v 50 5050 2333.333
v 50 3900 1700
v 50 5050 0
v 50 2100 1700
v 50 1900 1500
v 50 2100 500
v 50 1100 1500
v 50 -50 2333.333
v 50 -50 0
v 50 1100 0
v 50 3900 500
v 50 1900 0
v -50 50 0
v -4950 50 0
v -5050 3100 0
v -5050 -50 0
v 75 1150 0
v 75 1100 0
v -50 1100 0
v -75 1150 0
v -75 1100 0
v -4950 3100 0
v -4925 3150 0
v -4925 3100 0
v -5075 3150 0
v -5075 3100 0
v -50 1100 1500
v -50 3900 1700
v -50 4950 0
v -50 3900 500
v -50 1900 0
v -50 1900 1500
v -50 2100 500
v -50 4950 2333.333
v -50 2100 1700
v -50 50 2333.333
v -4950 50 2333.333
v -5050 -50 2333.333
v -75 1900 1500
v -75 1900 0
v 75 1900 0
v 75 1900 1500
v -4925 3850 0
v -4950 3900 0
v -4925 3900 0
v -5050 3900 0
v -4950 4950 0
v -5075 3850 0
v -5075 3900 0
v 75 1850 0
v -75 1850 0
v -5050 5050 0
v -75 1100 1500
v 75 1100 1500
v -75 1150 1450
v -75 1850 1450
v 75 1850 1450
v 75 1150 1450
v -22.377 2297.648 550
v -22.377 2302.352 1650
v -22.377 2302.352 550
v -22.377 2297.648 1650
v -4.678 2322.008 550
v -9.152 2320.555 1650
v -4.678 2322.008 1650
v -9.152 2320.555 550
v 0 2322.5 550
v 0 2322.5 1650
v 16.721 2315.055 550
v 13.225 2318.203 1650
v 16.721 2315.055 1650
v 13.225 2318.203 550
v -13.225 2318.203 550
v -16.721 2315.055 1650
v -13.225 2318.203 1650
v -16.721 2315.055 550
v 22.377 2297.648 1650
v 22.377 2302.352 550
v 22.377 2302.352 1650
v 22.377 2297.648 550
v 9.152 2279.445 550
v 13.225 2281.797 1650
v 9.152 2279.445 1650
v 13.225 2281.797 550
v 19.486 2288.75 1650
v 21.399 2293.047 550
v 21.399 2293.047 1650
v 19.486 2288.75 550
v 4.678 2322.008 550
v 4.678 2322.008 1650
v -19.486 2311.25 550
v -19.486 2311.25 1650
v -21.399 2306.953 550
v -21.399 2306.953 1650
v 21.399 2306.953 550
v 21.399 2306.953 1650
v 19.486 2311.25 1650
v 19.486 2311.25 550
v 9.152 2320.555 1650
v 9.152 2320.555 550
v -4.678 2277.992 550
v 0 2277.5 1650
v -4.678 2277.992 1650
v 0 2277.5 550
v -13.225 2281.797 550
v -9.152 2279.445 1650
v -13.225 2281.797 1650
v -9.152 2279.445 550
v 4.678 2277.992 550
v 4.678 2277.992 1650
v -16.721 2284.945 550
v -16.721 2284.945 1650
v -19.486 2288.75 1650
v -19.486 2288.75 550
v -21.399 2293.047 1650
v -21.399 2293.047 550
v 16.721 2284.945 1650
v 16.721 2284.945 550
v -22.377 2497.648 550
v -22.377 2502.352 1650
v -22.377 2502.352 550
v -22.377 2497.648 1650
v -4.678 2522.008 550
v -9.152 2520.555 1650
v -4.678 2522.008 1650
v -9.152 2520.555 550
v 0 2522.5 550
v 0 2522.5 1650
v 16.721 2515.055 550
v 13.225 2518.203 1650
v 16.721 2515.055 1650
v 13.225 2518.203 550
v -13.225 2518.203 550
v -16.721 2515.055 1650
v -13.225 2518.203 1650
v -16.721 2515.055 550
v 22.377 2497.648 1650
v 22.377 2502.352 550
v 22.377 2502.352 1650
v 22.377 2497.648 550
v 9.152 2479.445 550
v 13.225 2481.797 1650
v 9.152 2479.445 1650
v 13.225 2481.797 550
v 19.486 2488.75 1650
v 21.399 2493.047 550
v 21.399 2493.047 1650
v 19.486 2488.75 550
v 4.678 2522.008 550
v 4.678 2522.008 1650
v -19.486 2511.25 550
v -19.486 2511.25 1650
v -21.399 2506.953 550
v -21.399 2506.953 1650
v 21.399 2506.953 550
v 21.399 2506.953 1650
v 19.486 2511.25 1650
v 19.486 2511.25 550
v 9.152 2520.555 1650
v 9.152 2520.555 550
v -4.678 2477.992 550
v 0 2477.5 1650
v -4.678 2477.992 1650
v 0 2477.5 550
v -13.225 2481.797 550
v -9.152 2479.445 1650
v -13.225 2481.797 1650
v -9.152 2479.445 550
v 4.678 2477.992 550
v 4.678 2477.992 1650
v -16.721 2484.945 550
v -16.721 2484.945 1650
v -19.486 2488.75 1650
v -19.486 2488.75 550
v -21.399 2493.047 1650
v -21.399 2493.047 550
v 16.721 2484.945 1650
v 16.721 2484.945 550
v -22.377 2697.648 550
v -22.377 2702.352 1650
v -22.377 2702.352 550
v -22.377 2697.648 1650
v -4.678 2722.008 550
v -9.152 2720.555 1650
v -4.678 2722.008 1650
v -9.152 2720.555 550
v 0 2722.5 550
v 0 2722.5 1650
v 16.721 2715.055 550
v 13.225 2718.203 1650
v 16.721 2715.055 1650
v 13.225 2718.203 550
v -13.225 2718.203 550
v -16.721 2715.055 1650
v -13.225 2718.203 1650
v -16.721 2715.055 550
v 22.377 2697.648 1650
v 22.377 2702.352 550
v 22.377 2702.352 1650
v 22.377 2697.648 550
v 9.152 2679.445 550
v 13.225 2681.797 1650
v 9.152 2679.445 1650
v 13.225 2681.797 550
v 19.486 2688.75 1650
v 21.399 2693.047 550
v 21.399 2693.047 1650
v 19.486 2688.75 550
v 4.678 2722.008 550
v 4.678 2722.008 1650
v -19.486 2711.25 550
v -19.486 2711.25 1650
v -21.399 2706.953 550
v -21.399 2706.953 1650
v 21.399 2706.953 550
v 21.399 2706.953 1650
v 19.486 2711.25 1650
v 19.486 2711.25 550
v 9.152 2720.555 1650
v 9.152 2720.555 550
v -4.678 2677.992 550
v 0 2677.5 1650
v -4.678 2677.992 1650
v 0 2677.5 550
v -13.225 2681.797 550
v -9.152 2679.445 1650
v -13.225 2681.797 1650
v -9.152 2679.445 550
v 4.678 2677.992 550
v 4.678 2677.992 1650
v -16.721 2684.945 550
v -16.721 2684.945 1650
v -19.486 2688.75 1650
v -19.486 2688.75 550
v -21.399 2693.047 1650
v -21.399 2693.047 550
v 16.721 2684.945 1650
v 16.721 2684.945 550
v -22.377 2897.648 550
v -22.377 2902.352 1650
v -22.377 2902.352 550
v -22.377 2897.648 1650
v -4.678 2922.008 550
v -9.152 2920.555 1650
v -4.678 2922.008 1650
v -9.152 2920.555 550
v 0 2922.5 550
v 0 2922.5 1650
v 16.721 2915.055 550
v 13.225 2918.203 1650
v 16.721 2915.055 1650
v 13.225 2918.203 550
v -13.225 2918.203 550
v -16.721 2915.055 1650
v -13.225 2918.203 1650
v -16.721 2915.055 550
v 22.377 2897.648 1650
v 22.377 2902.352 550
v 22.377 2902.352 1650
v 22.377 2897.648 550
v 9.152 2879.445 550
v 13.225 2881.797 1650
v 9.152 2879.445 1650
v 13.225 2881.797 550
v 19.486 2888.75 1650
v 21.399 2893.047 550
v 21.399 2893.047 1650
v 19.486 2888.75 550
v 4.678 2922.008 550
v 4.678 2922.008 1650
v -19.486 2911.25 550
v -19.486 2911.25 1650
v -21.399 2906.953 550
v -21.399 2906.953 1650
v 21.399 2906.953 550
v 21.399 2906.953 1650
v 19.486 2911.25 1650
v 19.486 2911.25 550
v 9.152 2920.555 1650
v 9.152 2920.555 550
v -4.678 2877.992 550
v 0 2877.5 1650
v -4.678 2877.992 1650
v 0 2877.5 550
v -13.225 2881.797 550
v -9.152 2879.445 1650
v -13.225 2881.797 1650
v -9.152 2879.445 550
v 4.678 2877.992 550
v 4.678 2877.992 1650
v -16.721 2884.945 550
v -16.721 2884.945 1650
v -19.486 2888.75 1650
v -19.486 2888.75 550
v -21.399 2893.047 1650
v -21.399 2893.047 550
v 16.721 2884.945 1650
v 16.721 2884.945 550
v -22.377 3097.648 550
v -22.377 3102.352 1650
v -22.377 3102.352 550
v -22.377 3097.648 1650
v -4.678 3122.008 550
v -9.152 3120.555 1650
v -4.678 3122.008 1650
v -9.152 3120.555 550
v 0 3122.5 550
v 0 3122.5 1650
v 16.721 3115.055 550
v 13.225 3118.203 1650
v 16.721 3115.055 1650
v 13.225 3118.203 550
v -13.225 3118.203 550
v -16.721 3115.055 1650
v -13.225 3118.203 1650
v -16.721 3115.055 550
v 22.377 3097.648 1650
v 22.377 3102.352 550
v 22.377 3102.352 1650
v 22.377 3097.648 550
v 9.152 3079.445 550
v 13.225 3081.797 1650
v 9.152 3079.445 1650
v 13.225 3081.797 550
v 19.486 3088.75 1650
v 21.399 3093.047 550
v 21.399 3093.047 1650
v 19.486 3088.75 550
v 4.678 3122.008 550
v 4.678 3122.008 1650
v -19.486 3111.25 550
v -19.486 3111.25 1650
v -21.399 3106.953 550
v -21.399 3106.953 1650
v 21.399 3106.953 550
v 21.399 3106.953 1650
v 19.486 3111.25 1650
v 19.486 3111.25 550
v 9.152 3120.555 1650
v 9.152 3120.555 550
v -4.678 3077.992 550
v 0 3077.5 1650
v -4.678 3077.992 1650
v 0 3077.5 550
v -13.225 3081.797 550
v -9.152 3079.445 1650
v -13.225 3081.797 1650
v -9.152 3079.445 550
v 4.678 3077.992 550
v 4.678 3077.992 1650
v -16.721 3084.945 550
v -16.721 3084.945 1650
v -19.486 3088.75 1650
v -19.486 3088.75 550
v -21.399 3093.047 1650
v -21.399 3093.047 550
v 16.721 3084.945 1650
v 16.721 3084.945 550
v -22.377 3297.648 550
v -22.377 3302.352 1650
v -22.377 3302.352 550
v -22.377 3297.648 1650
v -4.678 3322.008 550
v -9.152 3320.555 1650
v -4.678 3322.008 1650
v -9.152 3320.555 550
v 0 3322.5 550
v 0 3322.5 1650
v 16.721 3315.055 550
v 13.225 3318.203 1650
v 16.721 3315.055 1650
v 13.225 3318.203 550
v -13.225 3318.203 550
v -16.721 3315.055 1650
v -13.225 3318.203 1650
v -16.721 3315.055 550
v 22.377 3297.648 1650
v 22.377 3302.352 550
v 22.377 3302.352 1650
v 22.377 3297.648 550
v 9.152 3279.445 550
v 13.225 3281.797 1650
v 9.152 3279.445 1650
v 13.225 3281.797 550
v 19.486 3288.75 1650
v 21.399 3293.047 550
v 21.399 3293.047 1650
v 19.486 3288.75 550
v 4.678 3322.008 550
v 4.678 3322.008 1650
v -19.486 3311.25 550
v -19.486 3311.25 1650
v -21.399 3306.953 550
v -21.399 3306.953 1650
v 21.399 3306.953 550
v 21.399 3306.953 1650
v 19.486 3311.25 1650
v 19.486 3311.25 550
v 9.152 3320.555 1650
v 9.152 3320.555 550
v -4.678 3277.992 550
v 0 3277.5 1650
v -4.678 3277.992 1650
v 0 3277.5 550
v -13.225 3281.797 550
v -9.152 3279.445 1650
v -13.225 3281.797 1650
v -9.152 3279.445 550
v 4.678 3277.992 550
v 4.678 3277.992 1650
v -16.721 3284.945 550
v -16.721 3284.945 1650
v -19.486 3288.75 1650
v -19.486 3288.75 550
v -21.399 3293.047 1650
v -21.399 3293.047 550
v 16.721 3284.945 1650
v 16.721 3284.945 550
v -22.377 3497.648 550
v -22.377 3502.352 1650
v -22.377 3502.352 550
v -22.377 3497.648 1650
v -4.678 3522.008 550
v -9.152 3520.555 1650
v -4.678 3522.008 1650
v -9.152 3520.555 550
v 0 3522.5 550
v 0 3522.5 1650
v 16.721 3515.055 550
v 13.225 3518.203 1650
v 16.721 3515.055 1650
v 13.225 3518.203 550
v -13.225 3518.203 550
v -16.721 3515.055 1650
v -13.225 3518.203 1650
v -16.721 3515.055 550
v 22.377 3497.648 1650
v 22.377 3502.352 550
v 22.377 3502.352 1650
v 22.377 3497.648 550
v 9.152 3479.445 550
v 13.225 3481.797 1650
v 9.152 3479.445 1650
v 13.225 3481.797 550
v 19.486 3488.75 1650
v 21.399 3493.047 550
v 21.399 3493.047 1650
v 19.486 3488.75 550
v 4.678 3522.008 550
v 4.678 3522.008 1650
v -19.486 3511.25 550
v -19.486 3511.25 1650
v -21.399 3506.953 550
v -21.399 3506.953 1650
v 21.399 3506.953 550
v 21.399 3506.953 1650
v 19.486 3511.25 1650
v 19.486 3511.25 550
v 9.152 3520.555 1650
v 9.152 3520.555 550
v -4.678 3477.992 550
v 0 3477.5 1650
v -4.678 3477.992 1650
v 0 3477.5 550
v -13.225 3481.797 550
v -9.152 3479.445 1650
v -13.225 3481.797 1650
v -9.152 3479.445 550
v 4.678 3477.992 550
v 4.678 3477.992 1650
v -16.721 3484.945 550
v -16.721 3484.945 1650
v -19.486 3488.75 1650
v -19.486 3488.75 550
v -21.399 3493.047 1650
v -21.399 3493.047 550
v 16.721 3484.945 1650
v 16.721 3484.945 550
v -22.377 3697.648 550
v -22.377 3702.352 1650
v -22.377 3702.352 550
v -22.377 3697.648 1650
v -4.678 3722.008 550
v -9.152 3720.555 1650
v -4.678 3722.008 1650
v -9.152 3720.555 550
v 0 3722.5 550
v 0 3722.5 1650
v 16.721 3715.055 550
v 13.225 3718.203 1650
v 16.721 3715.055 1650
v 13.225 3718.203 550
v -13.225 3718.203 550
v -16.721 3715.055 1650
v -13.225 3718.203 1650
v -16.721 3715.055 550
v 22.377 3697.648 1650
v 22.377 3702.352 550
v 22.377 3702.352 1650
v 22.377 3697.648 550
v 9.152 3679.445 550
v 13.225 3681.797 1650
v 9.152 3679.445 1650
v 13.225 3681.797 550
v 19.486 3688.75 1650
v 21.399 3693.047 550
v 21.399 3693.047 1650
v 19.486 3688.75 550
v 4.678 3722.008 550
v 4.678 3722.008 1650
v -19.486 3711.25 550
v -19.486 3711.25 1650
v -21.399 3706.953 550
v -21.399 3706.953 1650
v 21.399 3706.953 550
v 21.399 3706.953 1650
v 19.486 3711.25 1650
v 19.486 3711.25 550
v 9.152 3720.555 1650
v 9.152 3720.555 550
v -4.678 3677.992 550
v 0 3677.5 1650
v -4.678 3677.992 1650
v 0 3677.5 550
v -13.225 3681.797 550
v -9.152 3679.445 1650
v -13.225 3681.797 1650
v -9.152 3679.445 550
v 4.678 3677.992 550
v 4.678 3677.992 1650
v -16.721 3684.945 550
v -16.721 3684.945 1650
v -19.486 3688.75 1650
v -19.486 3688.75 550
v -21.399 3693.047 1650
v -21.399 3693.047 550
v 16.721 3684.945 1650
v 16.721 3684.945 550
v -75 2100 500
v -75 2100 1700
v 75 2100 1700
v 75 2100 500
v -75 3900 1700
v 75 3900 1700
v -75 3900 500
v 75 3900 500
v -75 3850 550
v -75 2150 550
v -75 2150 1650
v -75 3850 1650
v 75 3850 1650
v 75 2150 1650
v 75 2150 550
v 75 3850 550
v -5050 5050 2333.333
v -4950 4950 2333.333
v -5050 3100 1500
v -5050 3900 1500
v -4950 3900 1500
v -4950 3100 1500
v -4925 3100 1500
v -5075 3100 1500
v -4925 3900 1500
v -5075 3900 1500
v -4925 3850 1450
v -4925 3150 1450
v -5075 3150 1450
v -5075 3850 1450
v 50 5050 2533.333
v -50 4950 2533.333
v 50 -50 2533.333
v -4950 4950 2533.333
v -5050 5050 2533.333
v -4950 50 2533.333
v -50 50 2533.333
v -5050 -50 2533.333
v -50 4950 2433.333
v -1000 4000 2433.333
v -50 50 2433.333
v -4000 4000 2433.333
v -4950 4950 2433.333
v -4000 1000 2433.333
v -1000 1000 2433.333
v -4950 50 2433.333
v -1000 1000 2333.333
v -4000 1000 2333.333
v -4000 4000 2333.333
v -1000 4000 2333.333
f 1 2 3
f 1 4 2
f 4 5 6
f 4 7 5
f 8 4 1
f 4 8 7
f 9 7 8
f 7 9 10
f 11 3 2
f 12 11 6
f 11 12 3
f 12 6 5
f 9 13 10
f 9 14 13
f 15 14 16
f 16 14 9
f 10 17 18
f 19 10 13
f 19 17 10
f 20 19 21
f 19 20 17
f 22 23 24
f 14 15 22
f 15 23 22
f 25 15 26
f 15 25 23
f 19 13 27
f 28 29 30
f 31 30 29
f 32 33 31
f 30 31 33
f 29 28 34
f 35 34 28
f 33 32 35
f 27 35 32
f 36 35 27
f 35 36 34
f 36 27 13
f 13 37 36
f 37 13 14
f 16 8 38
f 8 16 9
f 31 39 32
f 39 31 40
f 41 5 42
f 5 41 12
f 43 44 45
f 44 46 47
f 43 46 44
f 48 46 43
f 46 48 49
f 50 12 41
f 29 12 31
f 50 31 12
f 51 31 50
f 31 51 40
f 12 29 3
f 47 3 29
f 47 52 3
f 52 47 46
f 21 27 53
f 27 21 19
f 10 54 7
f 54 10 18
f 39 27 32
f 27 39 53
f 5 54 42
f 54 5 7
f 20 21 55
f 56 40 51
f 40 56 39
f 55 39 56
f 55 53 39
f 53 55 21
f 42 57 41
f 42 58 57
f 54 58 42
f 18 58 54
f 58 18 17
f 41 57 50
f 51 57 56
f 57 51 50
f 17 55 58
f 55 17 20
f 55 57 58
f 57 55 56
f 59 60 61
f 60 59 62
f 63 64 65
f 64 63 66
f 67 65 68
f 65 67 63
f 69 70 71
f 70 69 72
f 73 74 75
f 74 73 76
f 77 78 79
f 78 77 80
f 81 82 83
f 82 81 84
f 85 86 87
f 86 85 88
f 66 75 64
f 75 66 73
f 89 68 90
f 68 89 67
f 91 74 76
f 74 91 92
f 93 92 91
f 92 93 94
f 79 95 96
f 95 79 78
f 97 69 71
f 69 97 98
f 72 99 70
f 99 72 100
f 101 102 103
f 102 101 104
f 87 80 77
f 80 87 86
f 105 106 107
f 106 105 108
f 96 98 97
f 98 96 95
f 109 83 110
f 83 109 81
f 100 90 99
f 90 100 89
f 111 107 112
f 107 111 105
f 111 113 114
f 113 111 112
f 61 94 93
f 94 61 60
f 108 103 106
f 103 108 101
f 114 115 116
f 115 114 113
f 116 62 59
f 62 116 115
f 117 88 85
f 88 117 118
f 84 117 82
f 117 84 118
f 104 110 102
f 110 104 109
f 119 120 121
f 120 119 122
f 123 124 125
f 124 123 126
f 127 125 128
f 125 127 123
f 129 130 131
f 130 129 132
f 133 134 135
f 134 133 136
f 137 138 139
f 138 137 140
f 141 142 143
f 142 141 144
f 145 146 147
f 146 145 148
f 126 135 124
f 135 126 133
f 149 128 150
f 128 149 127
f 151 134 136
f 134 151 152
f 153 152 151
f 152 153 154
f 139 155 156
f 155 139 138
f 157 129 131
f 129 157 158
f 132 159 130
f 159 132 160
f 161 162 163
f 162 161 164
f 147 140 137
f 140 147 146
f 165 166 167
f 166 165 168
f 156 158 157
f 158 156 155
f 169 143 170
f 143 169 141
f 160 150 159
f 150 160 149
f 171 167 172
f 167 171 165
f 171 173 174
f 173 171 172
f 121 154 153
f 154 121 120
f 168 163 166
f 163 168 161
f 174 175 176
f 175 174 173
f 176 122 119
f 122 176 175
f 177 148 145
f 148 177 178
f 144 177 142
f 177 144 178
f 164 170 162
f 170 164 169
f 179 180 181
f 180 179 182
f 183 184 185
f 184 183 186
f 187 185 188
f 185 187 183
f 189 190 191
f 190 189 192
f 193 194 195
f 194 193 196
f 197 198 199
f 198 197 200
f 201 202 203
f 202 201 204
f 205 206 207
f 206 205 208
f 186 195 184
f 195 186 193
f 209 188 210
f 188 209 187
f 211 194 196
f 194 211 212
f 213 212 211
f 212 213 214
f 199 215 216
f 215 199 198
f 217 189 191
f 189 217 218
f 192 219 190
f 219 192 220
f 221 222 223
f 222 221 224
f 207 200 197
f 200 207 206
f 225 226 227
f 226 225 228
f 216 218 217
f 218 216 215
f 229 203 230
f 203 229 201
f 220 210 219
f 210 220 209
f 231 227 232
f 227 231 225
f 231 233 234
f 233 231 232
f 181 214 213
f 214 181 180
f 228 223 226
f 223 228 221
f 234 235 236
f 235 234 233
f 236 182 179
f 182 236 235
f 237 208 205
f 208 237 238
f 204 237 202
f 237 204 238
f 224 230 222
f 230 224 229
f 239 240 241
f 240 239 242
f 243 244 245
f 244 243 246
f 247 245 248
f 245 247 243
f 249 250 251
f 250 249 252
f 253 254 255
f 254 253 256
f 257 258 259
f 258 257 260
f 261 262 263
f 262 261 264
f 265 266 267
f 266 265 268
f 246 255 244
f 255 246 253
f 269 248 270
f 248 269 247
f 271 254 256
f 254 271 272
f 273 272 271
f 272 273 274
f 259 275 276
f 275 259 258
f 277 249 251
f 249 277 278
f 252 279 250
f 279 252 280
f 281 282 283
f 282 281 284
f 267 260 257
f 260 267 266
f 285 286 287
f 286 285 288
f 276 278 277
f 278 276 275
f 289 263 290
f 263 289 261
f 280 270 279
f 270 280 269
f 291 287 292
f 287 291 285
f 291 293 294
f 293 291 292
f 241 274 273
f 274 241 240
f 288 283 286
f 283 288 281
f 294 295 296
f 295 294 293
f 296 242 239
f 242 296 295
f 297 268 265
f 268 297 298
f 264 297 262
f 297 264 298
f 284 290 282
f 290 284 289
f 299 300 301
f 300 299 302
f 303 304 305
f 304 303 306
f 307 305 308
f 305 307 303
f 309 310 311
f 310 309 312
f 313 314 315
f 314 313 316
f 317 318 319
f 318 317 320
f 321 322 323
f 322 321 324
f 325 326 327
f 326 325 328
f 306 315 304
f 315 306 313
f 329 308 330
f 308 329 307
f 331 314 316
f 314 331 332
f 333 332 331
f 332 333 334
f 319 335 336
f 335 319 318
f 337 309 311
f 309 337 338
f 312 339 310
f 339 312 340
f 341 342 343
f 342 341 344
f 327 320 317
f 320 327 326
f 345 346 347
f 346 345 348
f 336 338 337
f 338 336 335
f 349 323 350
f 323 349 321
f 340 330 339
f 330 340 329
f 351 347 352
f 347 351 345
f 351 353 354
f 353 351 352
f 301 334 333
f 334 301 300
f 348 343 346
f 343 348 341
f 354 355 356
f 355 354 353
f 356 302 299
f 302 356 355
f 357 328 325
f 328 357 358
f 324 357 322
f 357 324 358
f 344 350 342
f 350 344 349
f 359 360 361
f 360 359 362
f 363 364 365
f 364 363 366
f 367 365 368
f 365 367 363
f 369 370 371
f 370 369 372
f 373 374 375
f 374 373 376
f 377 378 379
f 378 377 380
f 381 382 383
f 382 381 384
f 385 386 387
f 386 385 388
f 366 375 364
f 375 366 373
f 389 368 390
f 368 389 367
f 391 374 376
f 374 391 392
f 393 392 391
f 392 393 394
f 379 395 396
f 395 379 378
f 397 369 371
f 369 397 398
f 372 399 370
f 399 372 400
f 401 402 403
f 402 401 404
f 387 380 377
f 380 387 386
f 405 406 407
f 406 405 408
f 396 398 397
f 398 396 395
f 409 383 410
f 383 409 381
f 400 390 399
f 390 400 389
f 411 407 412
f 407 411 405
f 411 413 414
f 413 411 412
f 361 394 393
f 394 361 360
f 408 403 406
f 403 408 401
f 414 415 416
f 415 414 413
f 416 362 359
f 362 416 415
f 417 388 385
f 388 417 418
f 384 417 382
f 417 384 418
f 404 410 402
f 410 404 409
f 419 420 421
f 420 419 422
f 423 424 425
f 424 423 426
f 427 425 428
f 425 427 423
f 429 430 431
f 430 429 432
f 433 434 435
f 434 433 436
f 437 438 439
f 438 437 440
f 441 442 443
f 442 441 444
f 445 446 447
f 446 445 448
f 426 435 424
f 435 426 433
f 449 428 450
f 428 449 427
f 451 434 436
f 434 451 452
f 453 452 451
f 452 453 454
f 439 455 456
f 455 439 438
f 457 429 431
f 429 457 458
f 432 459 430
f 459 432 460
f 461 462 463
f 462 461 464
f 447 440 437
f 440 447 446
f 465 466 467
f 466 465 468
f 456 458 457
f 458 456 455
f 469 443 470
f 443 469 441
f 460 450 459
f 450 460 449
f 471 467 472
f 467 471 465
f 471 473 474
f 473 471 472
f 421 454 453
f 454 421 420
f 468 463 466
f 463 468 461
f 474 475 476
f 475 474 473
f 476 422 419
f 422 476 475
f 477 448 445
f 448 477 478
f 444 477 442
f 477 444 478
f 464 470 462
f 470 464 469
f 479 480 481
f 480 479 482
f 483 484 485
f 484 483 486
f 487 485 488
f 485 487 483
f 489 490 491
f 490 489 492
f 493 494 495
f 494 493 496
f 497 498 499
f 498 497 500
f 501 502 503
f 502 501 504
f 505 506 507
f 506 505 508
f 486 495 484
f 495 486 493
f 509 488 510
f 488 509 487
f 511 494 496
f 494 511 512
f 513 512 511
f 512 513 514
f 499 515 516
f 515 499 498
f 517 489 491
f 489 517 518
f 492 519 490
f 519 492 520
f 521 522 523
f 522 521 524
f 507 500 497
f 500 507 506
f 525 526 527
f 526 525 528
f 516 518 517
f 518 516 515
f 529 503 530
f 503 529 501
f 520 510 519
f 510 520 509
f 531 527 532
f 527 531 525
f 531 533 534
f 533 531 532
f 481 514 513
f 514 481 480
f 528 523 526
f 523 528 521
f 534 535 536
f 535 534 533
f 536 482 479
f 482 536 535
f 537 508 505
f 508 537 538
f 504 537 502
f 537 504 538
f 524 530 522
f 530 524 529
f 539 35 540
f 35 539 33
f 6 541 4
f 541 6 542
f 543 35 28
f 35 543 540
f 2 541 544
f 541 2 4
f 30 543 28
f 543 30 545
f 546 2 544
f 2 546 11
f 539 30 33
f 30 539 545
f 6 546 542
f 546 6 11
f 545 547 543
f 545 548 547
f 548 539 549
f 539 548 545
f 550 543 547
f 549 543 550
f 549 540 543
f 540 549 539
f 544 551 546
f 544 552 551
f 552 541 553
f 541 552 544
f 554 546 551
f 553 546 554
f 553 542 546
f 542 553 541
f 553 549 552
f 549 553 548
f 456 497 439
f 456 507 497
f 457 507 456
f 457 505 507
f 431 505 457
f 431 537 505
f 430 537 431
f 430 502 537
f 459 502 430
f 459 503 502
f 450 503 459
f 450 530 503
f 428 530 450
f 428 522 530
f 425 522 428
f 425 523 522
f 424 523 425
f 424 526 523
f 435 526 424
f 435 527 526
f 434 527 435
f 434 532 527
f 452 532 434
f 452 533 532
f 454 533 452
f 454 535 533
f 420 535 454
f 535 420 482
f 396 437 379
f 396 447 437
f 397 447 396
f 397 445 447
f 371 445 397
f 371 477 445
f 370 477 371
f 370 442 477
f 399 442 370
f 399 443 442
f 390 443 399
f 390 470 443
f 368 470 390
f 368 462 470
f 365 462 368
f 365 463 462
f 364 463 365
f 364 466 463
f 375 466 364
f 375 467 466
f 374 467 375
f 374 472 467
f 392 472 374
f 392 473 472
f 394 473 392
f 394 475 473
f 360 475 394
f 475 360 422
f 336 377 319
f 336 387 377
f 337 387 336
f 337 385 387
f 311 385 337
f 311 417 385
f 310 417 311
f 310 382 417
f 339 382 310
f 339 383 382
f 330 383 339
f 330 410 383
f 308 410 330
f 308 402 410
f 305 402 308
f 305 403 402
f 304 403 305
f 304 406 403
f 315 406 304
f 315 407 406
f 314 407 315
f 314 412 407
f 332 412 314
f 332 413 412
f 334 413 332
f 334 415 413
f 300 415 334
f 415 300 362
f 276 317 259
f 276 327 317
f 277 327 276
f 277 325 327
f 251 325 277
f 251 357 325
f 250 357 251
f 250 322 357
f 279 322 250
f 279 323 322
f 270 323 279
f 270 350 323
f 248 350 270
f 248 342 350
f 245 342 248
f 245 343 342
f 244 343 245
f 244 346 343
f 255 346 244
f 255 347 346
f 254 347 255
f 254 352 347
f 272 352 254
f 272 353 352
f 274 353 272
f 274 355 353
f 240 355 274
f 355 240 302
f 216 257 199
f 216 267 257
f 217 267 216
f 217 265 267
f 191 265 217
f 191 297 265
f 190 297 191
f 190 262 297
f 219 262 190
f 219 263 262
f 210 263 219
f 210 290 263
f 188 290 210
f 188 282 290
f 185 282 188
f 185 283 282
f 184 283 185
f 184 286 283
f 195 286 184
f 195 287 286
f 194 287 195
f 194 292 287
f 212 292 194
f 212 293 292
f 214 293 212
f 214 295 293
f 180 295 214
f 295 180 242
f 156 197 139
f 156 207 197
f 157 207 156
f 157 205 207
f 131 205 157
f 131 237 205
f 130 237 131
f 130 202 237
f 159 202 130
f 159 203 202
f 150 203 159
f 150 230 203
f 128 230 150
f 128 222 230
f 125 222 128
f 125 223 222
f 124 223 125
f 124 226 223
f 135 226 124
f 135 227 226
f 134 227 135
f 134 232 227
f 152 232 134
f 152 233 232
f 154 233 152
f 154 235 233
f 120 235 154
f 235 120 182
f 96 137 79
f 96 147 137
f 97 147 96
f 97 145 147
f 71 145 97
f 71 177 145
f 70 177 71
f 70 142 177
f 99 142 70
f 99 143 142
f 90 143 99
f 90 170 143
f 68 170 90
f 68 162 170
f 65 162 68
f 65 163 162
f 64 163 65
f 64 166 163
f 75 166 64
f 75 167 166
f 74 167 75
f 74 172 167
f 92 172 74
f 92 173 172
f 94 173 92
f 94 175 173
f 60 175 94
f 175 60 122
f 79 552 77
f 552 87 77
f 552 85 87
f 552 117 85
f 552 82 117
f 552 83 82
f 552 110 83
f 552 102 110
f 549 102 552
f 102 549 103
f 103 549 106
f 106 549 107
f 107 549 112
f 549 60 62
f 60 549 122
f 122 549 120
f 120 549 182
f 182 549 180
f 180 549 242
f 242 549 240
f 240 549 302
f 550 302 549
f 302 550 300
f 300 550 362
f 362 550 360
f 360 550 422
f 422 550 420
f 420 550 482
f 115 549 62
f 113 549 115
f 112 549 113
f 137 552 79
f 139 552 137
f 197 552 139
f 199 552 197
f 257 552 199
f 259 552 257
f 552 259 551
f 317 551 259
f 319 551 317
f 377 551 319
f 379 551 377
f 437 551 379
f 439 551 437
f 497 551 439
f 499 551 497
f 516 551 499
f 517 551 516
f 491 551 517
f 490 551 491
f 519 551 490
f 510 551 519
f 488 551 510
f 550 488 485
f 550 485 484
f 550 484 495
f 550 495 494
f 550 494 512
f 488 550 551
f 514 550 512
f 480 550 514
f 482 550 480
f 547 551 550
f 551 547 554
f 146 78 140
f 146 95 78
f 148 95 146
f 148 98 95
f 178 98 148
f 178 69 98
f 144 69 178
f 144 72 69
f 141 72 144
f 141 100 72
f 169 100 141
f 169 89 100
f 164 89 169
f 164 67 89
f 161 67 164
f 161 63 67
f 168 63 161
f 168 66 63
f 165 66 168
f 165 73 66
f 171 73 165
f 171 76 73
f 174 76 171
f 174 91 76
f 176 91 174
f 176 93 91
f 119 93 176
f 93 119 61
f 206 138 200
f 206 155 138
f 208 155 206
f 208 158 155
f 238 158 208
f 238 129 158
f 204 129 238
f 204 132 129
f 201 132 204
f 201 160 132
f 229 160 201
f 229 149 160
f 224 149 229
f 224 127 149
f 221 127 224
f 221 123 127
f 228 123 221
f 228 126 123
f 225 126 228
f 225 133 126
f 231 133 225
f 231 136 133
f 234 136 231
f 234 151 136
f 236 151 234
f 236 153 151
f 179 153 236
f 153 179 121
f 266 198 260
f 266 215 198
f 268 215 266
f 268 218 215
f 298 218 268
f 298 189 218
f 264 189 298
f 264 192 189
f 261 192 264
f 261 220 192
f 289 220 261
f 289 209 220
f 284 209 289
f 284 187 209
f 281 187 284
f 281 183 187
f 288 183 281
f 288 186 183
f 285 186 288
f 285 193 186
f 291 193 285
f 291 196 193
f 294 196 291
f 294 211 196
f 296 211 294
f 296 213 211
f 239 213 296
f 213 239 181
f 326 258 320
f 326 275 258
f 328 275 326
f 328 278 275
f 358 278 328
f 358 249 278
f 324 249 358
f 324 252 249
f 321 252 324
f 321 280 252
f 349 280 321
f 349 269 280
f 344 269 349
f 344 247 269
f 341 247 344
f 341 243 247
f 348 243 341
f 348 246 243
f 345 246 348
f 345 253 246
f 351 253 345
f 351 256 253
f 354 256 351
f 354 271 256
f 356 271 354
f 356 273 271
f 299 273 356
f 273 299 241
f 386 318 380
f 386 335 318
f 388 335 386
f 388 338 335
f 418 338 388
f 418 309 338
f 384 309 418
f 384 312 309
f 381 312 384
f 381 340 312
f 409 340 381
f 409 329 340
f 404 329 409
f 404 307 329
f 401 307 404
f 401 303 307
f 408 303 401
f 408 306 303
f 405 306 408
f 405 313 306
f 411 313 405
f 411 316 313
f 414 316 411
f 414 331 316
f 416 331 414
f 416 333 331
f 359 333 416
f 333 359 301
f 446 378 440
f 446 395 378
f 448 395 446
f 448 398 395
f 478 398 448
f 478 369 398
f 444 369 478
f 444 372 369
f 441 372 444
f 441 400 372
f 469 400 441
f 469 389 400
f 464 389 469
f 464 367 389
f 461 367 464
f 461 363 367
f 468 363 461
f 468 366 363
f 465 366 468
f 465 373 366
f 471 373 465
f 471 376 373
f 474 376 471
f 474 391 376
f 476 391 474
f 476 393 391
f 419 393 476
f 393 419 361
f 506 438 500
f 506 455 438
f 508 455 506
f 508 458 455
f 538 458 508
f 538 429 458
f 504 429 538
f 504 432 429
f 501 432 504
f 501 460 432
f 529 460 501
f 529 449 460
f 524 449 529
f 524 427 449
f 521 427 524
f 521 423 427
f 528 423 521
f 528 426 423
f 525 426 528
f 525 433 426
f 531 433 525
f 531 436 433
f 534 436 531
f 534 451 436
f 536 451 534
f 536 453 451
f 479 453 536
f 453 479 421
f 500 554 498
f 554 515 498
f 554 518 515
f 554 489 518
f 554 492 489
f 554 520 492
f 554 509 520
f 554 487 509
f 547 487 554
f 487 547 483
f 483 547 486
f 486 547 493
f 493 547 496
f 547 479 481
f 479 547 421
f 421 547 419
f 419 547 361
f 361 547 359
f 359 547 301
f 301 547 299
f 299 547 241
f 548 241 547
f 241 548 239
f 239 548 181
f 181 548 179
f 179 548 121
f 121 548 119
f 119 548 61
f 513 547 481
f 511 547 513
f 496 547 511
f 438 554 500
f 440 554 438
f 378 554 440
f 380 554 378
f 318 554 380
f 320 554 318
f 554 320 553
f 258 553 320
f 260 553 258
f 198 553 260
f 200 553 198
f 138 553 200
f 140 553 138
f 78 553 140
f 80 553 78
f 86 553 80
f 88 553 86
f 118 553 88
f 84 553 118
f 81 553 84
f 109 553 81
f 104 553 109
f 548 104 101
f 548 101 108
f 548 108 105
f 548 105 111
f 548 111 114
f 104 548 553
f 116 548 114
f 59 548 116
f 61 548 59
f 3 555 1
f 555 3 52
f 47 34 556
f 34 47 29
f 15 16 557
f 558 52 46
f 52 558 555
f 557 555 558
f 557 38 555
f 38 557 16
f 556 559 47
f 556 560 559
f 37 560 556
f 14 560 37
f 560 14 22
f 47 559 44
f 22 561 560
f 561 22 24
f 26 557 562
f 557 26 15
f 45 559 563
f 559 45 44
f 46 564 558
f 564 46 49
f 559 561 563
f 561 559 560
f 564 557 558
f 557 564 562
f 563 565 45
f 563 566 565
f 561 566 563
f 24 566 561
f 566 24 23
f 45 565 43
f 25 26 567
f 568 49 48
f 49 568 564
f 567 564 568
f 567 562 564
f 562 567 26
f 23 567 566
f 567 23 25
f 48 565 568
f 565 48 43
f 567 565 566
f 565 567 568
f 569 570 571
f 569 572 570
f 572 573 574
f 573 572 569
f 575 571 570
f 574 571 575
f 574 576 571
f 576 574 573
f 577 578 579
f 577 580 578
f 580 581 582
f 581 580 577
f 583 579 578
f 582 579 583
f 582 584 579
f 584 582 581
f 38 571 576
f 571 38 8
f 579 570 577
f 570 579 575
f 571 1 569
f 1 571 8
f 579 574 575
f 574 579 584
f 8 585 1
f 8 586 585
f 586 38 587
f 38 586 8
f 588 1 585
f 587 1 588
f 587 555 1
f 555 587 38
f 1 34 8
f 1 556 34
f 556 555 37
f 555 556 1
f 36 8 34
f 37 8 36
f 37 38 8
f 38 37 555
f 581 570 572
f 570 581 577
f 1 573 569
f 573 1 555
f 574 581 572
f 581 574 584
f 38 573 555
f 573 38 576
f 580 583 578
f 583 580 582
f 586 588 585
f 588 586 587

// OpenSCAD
// file: ../../libs/templates/t_flat-roof.scad
include <../basic-dims.scad>

flat_roof_wall_offset = section_thickness/2;

module flat_roof_straight() {
    rotate([0, 0, 90])
    translate([0, -flat_roof_wall_offset, 0])
    union() {
        translate([0, 0, section_thickness])
        cube([section_width, section_thickness, section_thickness]);
        cube([section_width, section_width + flat_roof_wall_offset, section_thickness]);
    }
}

module flat_roof_corner() {
    rotate([0, 0, 90])
    translate([-flat_roof_wall_offset, -flat_roof_wall_offset, 0])
    union() {
        translate([0, 0, section_thickness]) {
            cube([section_width + flat_roof_wall_offset, section_thickness, section_thickness]);
            cube([section_thickness, section_width + flat_roof_wall_offset, section_thickness]);
        }
        cube([
                section_width + flat_roof_wall_offset,
                section_width + flat_roof_wall_offset,
                section_thickness
            ]);
    }
}

module flat_roof_diagonal() {
    corrected_width = section_width + flat_roof_wall_offset;

    rotate([0, 0, 180])
    translate([-flat_roof_wall_offset, -flat_roof_wall_offset - section_width, 0])
    union() {
        linear_extrude(section_thickness)
        polygon([
            [0, corrected_width],
            [corrected_width, corrected_width],
            [corrected_width, 0]
        ]);

        translate([0, 0, section_thickness])
        linear_extrude(section_thickness)
        polygon([
            [0, corrected_width],
            [section_thickness, corrected_width],
            [corrected_width, section_thickness],
            [corrected_width, 0]
        ]);
    }
}

module flat_roof_square() {
    translate([-section_width, 0, 0])
    cube([section_width, section_width, section_thickness]);
}
// file: ../../libs/modifiers/diagonalize.scad
include <../basic-dims.scad>

module diagonalize_triangle_sketch(t = section_thickness) {
    x = sin(45) * t;
    y = cos(45) * t;

    polygon([
        [0, y],
        [x, 0],
        [0, -y]
    ]);
}

module diagonalize_triangle(t = section_thickness) {
    rotate([0, 0, 90])
    linear_extrude(section_height)
    diagonalize_triangle_sketch(t);
}

module diagonalize2D() {
    thickness = section_thickness / rt;

    trans = (section_thickness/2)*rt/2;
    len_scale = rt - section_thickness / (rt * section_width);

    rotate([0, 0, 45])
    translate([trans, 0, 0])
    scale([len_scale, 1/rt, 1])
    children();
}


module diagonalize3D(w = section_width, t = section_thickness, edges = "trans") {

    trans = (t/2)*rt/2;
    len_scale = rt - t / (rt * w);

    edge_angle = edges == "cis" ? 270 : 180;
    
    diagonalize_triangle(t/rt);

    translate([-w, w, 0])
    rotate([0, 0, edge_angle]) // 180 For continue, -90 (270) for end
    diagonalize_triangle(t/rt);

    rotate([0, 0, 45])
    translate([0, trans, 0])
    scale([1/rt, len_scale, 1])
    children();
}
// file: ../../libs/modifiers/cornerize.scad
include <../basic-dims.scad>

trim_depth = 10000;

module cornerize_trim(amount, height = section_height) {
    difference() {
        children();
        translate([-trim_depth/2, 0, 0])
        cube([trim_depth, amount, height]);
    }
}

//  Child 0 is front
//  Child 1 is side
module cornerize(front_width = section_width, front_thickness = section_thickness,
    side_width = section_width, side_thickness = section_thickness, height=section_height) {
    
    new_front_size = front_width - side_thickness/2;
    front_scale_amt = new_front_size / front_width;
    
    new_side_size = side_width - front_thickness/2;
    side_scale_amt = new_side_size / side_width;

    //translate([0, side_thickness/2, 0])
    //scale([1, front_scale_amt, 1])
    cornerize_trim(side_thickness/2)
    children(0);

    rotate([0, 0, 90])
    cornerize_trim(front_thickness/2)
    children(1);

    translate([-front_thickness/2, -side_thickness/2, 0])
    cube([front_thickness, side_thickness, height]);
}
// file: ../../libs/templates/t_window-frame.scad
include <../basic-dims.scad>
include <./t_window.scad>

window_frame_frame_thickness = unit / 20;
window_frame_frame_depth = section_thickness + window_frame_frame_thickness;

window_frame_total_width = simple_window_width;
window_frame_total_height = simple_window_height;

module window_frame_sketch() {

    pane_width = window_frame_total_width - window_frame_frame_thickness*2;
    pane_height = window_frame_total_height/2 - window_frame_frame_thickness*3/2;

    pane_horz_trans = window_frame_total_width/2 - pane_width/2;

    difference() {
        square([window_frame_total_width,  window_frame_total_height]);

        translate([pane_horz_trans, pane_height + window_frame_frame_thickness*2, 0])
        square([pane_width, pane_height]);

        translate([pane_horz_trans, window_frame_frame_thickness, 0])
        square([pane_width, pane_height]);
    }
}

module window_frame() {
    translate([-window_frame_frame_depth/2, section_width/2-window_frame_total_width/2, simple_window_bottom_offset])
    rotate([90, 0, 90])
    linear_extrude(window_frame_frame_depth)
    window_frame_sketch();
}
// file: ../../libs/templates/t_door-frame.scad
include <../basic-dims.scad>
include <./t_door.scad>

door_frame_frame_thickness = unit / 20;
door_frame_frame_depth = section_thickness + unit/20;

door_frame_frame_inner_width = simple_door_door_width - door_frame_frame_thickness*2;
door_frame_frame_inner_height = simple_door_door_height - door_frame_frame_thickness;

module door_frame_sketch() {
    difference() {
        square([simple_door_door_width, simple_door_door_height]);

        translate([door_frame_frame_thickness, 0, 0])
        square([simple_door_door_width - door_frame_frame_thickness*2, simple_door_door_height - door_frame_frame_thickness]);
    }
}

module door_frame() {
    translate([0, section_width/2-simple_door_door_width/2, 0])
    translate([-door_frame_frame_depth/2, 0, 0])
    rotate([90, 0, 90])
    linear_extrude(door_frame_frame_depth)
    door_frame_sketch();
}
// file: ../../libs/templates/t_window.scad
include <../basic-dims.scad>

simple_window_width = 0.6 * section_width;
simple_window_height = 0.4 * section_height;
simple_window_bottom_offset = 0.4 * section_height;

module simple_window_sketch() {
    difference() {
        square([section_width, section_height]);

        translate([
            section_width/2 - simple_window_width/2,
            simple_window_bottom_offset,
            0])
        square([simple_window_width, simple_window_height]);
    }
}

module window() {
    rotate([90, 0, 90])
    translate([0, 0, -section_thickness/2])
    linear_extrude(section_thickness)
    simple_window_sketch();
}
// file: ../../libs/templates/t_box-roof.scad
include <../basic-dims.scad>

include <../modifiers/cornerize.scad>

include <./t_flat-roof.scad>

_box_roof_wall_height = unit/3;

module _roof_wall() {
    translate([-section_thickness/2, 0, 0])
    cube([section_thickness, section_width, _box_roof_wall_height]);
}

module box_roof_square() {
    translate([0, 0, _box_roof_wall_height]) {
        flat_roof_square();
    }
}

module box_roof_straight() {
    translate([0, 0, _box_roof_wall_height])
    flat_roof_straight();

    _roof_wall();
}

module box_roof_corner() {
    translate([0, 0, _box_roof_wall_height])
    flat_roof_corner();

    cornerize(height=_box_roof_wall_height) {
        _roof_wall();
        _roof_wall();
    }
}
// file: ../../libs/templates/t_shop-window.scad
include <../basic-dims.scad>
include <../modifiers/diagonalize.scad>

shop_window_total_width = section_width * 2;

shop_window_width = shop_window_total_width * 0.9;
shop_window_height = section_height * 0.6;
shop_window_window_offset_bottom = section_height * 0.25;

shop_window_bar_diam = section_thickness * 0.45;
shop_window_window_padding = (shop_window_total_width - shop_window_width)/2;
bar_x_offset = shop_window_window_padding;
shop_window_num_bars = 8;
shop_window_bar_gap = shop_window_width/(shop_window_num_bars + 1);

shop_window_frame_frame_thickness = unit / 20;
shop_window_frame_frame_depth = section_thickness + shop_window_frame_frame_thickness;

shop_window_frame_total_width = shop_window_width;
shop_window_frame_total_height = shop_window_height;

module shop_window_sketch() {

    difference() {
        square([shop_window_total_width, section_height]);

        translate([shop_window_total_width/2 - shop_window_width/2, shop_window_window_offset_bottom, 0])
        square([shop_window_width, shop_window_height]);
    }
}

module shop_window_frame_sketch() {

    pane_width = shop_window_frame_total_width - shop_window_frame_frame_thickness*2;
    pane_height = shop_window_frame_total_height - shop_window_frame_frame_thickness*2;

    pane_horz_trans = shop_window_frame_total_width/2 - pane_width/2;

    difference() {
        square([shop_window_frame_total_width,  shop_window_frame_total_height]);

        translate([pane_horz_trans, shop_window_frame_frame_thickness, 0])
        square([pane_width, pane_height]);
    }
}

module shop_window() {
    rotate([90, 0, 90])
    translate([0, 0, -section_thickness/2])
    linear_extrude(section_thickness)
    shop_window_sketch();
}

module shop_window_bars() {
    rotate([90, 0, 90])
    for (i = [1 : shop_window_num_bars]) {
        translate([0, 0, -section_thickness/2])
        translate([bar_x_offset + shop_window_bar_gap* i, shop_window_window_offset_bottom, section_thickness/2])
        rotate([-90, 0, 0])
        cylinder(d=shop_window_bar_diam, h = shop_window_height);
    }
}

module shop_window_frame() {
    translate([-shop_window_frame_frame_depth/2, section_width-shop_window_frame_total_width/2, shop_window_window_offset_bottom])
    rotate([90, 0, 90])
    linear_extrude(shop_window_frame_frame_depth)
    shop_window_frame_sketch();
}
// file: ../../libs/templates/t_door.scad
include <../basic-dims.scad>

simple_door_door_width = section_width * 0.8;
simple_door_door_height = section_height * 0.75;

module door_sketch() {
    difference() {
        square([section_width, section_height]);

        translate([section_width/2 - simple_door_door_width/2, 0, 0])
        square([simple_door_door_width, simple_door_door_height]);
    }   
}

module door() {
    rotate([90, 0, 90])
    translate([0, 0, -section_thickness/2])
    linear_extrude(section_thickness)
    door_sketch();
}
// file: ../../libs/templates/t_wall.scad
include <../basic-dims.scad>
include <../modifiers/cornerize.scad>

module wall() {
    translate([-section_thickness/2, 0, 0])
    cube([section_thickness, section_width, section_height]);
}

module wall_corner() {
    cornerize() {
        wall();
        wall();
    }
}
// file: ../../libs/basic-dims.scad
unit = 1000;

section_width = unit;
section_height = unit * 2;
section_thickness = unit * 0.1;

rt = sqrt(2);

//  -- Notes --
//  Z is UP
//  X is FORWARD (out of the screen)
// main file
include <../../libs/basic-dims.scad>
include <../../libs/templates/t_wall.scad>
include <../../libs/templates/t_door.scad>
include <../../libs/templates/t_shop-window.scad>
include <../../libs/templates/t_box-roof.scad>
include <../../libs/templates/t_window.scad>
include <../../libs/templates/t_door-frame.scad>
include <../../libs/templates/t_window-frame.scad>

module wall_with_lwindow() {
    wall_corner();

    translate([0, section_width, 0]) {
        door();
        door_frame();
    }

    translate([0, section_width*2, 0]) {
        shop_window();
        shop_window_frame();
        shop_window_bars();
    }

    translate([0, section_width*4, 0])
    wall();

    translate([0, section_width*5, 0])
    rotate([0, 0, 90])
    wall_corner();
}

module wall_with_offset_door() {

    wall_corner();

    translate([0, section_width*5, 0])
    rotate([0, 0, 90])
    wall_corner();

    translate([0, section_width, 0]) {
        door();
        door_frame();
    }

    for (i = [1 : 2]) {
        translate([0, section_width + section_width*i, 0])
        wall();
    }
}

module wall_solid_no_corner() {
    for (i = [1 : 3]) {
        translate([0, section_width*i, 0])
        wall();
    }
}

module wall_solid_with_corner() {
    wall_corner();

    for (i = [1 : 3]) {
        translate([0, section_width*i, 0])
        wall();
    }
}

module wall_with_two_windows() {
    wall_corner();

    translate([0, section_width*1, 0]) {
        window();
        window_frame();
    }

    translate([0, section_width*2, 0])
    wall();

    translate([0, section_width*3, 0]) {
        window();
        window_frame();
    }
}

module roof_edge(len) {
    box_roof_corner();

    for (i = [1:len]) {
        translate([0, i*section_width, 0])
        box_roof_straight();
    }
}

module roof_middle() {
    for (x = [0 : 2]) {
        for (y = [0 : 2]) {
            translate([-x*section_width, y*section_width, 0])
            box_roof_square();
        }
    }
}

module roof() {
    roof_edge(3);

    translate([0, section_width*5, 0])
    rotate([0, 0, 90])
    roof_edge(3);

    translate([-section_width*5, section_width*5, 0])
    rotate([0, 0, 180])
    roof_edge(3);

    translate([-section_width*5, 0, 0])
    rotate([0, 0, -90])
    roof_edge(3);

    translate([-section_width, section_width, 0])
    roof_middle();
}

module ground_floor() {
    color([1.0, 0.0, 0.0])
    wall_with_lwindow();

    color([0.0, 1.0, 0.0]) {
        rotate([0, 0, 90])
        wall_solid_no_corner();

        translate([0, section_width*5, 0])
        rotate([0, 0, 90])
        wall_solid_no_corner();
    }

    color([0.0, 0.0, 1.0])
    translate([-section_width*5, section_width*5, 0])
    rotate([0, 0, 180])
    wall_with_offset_door();
}

module first_floor() {
    color([0.0, 0.0, 1.0])
    wall_with_two_windows();

    color([1.0, 0.0, 0.0])
    translate([-section_width*5, 0, 0])
    rotate([0, 0, -90])
    wall_with_two_windows();

    color([1.0, 0.0, 1.0])
    translate([-section_width*5, section_width*5, 0])
    rotate([0, 0, -180])
    wall_solid_with_corner();

    translate([0, section_width*5, 0])
    rotate([0, 0, 90])
    wall_solid_with_corner();
}

ground_floor();

//translate([0, 0, section_height])
//first_floor();

translate([0, 0, section_height*1])
roof();
